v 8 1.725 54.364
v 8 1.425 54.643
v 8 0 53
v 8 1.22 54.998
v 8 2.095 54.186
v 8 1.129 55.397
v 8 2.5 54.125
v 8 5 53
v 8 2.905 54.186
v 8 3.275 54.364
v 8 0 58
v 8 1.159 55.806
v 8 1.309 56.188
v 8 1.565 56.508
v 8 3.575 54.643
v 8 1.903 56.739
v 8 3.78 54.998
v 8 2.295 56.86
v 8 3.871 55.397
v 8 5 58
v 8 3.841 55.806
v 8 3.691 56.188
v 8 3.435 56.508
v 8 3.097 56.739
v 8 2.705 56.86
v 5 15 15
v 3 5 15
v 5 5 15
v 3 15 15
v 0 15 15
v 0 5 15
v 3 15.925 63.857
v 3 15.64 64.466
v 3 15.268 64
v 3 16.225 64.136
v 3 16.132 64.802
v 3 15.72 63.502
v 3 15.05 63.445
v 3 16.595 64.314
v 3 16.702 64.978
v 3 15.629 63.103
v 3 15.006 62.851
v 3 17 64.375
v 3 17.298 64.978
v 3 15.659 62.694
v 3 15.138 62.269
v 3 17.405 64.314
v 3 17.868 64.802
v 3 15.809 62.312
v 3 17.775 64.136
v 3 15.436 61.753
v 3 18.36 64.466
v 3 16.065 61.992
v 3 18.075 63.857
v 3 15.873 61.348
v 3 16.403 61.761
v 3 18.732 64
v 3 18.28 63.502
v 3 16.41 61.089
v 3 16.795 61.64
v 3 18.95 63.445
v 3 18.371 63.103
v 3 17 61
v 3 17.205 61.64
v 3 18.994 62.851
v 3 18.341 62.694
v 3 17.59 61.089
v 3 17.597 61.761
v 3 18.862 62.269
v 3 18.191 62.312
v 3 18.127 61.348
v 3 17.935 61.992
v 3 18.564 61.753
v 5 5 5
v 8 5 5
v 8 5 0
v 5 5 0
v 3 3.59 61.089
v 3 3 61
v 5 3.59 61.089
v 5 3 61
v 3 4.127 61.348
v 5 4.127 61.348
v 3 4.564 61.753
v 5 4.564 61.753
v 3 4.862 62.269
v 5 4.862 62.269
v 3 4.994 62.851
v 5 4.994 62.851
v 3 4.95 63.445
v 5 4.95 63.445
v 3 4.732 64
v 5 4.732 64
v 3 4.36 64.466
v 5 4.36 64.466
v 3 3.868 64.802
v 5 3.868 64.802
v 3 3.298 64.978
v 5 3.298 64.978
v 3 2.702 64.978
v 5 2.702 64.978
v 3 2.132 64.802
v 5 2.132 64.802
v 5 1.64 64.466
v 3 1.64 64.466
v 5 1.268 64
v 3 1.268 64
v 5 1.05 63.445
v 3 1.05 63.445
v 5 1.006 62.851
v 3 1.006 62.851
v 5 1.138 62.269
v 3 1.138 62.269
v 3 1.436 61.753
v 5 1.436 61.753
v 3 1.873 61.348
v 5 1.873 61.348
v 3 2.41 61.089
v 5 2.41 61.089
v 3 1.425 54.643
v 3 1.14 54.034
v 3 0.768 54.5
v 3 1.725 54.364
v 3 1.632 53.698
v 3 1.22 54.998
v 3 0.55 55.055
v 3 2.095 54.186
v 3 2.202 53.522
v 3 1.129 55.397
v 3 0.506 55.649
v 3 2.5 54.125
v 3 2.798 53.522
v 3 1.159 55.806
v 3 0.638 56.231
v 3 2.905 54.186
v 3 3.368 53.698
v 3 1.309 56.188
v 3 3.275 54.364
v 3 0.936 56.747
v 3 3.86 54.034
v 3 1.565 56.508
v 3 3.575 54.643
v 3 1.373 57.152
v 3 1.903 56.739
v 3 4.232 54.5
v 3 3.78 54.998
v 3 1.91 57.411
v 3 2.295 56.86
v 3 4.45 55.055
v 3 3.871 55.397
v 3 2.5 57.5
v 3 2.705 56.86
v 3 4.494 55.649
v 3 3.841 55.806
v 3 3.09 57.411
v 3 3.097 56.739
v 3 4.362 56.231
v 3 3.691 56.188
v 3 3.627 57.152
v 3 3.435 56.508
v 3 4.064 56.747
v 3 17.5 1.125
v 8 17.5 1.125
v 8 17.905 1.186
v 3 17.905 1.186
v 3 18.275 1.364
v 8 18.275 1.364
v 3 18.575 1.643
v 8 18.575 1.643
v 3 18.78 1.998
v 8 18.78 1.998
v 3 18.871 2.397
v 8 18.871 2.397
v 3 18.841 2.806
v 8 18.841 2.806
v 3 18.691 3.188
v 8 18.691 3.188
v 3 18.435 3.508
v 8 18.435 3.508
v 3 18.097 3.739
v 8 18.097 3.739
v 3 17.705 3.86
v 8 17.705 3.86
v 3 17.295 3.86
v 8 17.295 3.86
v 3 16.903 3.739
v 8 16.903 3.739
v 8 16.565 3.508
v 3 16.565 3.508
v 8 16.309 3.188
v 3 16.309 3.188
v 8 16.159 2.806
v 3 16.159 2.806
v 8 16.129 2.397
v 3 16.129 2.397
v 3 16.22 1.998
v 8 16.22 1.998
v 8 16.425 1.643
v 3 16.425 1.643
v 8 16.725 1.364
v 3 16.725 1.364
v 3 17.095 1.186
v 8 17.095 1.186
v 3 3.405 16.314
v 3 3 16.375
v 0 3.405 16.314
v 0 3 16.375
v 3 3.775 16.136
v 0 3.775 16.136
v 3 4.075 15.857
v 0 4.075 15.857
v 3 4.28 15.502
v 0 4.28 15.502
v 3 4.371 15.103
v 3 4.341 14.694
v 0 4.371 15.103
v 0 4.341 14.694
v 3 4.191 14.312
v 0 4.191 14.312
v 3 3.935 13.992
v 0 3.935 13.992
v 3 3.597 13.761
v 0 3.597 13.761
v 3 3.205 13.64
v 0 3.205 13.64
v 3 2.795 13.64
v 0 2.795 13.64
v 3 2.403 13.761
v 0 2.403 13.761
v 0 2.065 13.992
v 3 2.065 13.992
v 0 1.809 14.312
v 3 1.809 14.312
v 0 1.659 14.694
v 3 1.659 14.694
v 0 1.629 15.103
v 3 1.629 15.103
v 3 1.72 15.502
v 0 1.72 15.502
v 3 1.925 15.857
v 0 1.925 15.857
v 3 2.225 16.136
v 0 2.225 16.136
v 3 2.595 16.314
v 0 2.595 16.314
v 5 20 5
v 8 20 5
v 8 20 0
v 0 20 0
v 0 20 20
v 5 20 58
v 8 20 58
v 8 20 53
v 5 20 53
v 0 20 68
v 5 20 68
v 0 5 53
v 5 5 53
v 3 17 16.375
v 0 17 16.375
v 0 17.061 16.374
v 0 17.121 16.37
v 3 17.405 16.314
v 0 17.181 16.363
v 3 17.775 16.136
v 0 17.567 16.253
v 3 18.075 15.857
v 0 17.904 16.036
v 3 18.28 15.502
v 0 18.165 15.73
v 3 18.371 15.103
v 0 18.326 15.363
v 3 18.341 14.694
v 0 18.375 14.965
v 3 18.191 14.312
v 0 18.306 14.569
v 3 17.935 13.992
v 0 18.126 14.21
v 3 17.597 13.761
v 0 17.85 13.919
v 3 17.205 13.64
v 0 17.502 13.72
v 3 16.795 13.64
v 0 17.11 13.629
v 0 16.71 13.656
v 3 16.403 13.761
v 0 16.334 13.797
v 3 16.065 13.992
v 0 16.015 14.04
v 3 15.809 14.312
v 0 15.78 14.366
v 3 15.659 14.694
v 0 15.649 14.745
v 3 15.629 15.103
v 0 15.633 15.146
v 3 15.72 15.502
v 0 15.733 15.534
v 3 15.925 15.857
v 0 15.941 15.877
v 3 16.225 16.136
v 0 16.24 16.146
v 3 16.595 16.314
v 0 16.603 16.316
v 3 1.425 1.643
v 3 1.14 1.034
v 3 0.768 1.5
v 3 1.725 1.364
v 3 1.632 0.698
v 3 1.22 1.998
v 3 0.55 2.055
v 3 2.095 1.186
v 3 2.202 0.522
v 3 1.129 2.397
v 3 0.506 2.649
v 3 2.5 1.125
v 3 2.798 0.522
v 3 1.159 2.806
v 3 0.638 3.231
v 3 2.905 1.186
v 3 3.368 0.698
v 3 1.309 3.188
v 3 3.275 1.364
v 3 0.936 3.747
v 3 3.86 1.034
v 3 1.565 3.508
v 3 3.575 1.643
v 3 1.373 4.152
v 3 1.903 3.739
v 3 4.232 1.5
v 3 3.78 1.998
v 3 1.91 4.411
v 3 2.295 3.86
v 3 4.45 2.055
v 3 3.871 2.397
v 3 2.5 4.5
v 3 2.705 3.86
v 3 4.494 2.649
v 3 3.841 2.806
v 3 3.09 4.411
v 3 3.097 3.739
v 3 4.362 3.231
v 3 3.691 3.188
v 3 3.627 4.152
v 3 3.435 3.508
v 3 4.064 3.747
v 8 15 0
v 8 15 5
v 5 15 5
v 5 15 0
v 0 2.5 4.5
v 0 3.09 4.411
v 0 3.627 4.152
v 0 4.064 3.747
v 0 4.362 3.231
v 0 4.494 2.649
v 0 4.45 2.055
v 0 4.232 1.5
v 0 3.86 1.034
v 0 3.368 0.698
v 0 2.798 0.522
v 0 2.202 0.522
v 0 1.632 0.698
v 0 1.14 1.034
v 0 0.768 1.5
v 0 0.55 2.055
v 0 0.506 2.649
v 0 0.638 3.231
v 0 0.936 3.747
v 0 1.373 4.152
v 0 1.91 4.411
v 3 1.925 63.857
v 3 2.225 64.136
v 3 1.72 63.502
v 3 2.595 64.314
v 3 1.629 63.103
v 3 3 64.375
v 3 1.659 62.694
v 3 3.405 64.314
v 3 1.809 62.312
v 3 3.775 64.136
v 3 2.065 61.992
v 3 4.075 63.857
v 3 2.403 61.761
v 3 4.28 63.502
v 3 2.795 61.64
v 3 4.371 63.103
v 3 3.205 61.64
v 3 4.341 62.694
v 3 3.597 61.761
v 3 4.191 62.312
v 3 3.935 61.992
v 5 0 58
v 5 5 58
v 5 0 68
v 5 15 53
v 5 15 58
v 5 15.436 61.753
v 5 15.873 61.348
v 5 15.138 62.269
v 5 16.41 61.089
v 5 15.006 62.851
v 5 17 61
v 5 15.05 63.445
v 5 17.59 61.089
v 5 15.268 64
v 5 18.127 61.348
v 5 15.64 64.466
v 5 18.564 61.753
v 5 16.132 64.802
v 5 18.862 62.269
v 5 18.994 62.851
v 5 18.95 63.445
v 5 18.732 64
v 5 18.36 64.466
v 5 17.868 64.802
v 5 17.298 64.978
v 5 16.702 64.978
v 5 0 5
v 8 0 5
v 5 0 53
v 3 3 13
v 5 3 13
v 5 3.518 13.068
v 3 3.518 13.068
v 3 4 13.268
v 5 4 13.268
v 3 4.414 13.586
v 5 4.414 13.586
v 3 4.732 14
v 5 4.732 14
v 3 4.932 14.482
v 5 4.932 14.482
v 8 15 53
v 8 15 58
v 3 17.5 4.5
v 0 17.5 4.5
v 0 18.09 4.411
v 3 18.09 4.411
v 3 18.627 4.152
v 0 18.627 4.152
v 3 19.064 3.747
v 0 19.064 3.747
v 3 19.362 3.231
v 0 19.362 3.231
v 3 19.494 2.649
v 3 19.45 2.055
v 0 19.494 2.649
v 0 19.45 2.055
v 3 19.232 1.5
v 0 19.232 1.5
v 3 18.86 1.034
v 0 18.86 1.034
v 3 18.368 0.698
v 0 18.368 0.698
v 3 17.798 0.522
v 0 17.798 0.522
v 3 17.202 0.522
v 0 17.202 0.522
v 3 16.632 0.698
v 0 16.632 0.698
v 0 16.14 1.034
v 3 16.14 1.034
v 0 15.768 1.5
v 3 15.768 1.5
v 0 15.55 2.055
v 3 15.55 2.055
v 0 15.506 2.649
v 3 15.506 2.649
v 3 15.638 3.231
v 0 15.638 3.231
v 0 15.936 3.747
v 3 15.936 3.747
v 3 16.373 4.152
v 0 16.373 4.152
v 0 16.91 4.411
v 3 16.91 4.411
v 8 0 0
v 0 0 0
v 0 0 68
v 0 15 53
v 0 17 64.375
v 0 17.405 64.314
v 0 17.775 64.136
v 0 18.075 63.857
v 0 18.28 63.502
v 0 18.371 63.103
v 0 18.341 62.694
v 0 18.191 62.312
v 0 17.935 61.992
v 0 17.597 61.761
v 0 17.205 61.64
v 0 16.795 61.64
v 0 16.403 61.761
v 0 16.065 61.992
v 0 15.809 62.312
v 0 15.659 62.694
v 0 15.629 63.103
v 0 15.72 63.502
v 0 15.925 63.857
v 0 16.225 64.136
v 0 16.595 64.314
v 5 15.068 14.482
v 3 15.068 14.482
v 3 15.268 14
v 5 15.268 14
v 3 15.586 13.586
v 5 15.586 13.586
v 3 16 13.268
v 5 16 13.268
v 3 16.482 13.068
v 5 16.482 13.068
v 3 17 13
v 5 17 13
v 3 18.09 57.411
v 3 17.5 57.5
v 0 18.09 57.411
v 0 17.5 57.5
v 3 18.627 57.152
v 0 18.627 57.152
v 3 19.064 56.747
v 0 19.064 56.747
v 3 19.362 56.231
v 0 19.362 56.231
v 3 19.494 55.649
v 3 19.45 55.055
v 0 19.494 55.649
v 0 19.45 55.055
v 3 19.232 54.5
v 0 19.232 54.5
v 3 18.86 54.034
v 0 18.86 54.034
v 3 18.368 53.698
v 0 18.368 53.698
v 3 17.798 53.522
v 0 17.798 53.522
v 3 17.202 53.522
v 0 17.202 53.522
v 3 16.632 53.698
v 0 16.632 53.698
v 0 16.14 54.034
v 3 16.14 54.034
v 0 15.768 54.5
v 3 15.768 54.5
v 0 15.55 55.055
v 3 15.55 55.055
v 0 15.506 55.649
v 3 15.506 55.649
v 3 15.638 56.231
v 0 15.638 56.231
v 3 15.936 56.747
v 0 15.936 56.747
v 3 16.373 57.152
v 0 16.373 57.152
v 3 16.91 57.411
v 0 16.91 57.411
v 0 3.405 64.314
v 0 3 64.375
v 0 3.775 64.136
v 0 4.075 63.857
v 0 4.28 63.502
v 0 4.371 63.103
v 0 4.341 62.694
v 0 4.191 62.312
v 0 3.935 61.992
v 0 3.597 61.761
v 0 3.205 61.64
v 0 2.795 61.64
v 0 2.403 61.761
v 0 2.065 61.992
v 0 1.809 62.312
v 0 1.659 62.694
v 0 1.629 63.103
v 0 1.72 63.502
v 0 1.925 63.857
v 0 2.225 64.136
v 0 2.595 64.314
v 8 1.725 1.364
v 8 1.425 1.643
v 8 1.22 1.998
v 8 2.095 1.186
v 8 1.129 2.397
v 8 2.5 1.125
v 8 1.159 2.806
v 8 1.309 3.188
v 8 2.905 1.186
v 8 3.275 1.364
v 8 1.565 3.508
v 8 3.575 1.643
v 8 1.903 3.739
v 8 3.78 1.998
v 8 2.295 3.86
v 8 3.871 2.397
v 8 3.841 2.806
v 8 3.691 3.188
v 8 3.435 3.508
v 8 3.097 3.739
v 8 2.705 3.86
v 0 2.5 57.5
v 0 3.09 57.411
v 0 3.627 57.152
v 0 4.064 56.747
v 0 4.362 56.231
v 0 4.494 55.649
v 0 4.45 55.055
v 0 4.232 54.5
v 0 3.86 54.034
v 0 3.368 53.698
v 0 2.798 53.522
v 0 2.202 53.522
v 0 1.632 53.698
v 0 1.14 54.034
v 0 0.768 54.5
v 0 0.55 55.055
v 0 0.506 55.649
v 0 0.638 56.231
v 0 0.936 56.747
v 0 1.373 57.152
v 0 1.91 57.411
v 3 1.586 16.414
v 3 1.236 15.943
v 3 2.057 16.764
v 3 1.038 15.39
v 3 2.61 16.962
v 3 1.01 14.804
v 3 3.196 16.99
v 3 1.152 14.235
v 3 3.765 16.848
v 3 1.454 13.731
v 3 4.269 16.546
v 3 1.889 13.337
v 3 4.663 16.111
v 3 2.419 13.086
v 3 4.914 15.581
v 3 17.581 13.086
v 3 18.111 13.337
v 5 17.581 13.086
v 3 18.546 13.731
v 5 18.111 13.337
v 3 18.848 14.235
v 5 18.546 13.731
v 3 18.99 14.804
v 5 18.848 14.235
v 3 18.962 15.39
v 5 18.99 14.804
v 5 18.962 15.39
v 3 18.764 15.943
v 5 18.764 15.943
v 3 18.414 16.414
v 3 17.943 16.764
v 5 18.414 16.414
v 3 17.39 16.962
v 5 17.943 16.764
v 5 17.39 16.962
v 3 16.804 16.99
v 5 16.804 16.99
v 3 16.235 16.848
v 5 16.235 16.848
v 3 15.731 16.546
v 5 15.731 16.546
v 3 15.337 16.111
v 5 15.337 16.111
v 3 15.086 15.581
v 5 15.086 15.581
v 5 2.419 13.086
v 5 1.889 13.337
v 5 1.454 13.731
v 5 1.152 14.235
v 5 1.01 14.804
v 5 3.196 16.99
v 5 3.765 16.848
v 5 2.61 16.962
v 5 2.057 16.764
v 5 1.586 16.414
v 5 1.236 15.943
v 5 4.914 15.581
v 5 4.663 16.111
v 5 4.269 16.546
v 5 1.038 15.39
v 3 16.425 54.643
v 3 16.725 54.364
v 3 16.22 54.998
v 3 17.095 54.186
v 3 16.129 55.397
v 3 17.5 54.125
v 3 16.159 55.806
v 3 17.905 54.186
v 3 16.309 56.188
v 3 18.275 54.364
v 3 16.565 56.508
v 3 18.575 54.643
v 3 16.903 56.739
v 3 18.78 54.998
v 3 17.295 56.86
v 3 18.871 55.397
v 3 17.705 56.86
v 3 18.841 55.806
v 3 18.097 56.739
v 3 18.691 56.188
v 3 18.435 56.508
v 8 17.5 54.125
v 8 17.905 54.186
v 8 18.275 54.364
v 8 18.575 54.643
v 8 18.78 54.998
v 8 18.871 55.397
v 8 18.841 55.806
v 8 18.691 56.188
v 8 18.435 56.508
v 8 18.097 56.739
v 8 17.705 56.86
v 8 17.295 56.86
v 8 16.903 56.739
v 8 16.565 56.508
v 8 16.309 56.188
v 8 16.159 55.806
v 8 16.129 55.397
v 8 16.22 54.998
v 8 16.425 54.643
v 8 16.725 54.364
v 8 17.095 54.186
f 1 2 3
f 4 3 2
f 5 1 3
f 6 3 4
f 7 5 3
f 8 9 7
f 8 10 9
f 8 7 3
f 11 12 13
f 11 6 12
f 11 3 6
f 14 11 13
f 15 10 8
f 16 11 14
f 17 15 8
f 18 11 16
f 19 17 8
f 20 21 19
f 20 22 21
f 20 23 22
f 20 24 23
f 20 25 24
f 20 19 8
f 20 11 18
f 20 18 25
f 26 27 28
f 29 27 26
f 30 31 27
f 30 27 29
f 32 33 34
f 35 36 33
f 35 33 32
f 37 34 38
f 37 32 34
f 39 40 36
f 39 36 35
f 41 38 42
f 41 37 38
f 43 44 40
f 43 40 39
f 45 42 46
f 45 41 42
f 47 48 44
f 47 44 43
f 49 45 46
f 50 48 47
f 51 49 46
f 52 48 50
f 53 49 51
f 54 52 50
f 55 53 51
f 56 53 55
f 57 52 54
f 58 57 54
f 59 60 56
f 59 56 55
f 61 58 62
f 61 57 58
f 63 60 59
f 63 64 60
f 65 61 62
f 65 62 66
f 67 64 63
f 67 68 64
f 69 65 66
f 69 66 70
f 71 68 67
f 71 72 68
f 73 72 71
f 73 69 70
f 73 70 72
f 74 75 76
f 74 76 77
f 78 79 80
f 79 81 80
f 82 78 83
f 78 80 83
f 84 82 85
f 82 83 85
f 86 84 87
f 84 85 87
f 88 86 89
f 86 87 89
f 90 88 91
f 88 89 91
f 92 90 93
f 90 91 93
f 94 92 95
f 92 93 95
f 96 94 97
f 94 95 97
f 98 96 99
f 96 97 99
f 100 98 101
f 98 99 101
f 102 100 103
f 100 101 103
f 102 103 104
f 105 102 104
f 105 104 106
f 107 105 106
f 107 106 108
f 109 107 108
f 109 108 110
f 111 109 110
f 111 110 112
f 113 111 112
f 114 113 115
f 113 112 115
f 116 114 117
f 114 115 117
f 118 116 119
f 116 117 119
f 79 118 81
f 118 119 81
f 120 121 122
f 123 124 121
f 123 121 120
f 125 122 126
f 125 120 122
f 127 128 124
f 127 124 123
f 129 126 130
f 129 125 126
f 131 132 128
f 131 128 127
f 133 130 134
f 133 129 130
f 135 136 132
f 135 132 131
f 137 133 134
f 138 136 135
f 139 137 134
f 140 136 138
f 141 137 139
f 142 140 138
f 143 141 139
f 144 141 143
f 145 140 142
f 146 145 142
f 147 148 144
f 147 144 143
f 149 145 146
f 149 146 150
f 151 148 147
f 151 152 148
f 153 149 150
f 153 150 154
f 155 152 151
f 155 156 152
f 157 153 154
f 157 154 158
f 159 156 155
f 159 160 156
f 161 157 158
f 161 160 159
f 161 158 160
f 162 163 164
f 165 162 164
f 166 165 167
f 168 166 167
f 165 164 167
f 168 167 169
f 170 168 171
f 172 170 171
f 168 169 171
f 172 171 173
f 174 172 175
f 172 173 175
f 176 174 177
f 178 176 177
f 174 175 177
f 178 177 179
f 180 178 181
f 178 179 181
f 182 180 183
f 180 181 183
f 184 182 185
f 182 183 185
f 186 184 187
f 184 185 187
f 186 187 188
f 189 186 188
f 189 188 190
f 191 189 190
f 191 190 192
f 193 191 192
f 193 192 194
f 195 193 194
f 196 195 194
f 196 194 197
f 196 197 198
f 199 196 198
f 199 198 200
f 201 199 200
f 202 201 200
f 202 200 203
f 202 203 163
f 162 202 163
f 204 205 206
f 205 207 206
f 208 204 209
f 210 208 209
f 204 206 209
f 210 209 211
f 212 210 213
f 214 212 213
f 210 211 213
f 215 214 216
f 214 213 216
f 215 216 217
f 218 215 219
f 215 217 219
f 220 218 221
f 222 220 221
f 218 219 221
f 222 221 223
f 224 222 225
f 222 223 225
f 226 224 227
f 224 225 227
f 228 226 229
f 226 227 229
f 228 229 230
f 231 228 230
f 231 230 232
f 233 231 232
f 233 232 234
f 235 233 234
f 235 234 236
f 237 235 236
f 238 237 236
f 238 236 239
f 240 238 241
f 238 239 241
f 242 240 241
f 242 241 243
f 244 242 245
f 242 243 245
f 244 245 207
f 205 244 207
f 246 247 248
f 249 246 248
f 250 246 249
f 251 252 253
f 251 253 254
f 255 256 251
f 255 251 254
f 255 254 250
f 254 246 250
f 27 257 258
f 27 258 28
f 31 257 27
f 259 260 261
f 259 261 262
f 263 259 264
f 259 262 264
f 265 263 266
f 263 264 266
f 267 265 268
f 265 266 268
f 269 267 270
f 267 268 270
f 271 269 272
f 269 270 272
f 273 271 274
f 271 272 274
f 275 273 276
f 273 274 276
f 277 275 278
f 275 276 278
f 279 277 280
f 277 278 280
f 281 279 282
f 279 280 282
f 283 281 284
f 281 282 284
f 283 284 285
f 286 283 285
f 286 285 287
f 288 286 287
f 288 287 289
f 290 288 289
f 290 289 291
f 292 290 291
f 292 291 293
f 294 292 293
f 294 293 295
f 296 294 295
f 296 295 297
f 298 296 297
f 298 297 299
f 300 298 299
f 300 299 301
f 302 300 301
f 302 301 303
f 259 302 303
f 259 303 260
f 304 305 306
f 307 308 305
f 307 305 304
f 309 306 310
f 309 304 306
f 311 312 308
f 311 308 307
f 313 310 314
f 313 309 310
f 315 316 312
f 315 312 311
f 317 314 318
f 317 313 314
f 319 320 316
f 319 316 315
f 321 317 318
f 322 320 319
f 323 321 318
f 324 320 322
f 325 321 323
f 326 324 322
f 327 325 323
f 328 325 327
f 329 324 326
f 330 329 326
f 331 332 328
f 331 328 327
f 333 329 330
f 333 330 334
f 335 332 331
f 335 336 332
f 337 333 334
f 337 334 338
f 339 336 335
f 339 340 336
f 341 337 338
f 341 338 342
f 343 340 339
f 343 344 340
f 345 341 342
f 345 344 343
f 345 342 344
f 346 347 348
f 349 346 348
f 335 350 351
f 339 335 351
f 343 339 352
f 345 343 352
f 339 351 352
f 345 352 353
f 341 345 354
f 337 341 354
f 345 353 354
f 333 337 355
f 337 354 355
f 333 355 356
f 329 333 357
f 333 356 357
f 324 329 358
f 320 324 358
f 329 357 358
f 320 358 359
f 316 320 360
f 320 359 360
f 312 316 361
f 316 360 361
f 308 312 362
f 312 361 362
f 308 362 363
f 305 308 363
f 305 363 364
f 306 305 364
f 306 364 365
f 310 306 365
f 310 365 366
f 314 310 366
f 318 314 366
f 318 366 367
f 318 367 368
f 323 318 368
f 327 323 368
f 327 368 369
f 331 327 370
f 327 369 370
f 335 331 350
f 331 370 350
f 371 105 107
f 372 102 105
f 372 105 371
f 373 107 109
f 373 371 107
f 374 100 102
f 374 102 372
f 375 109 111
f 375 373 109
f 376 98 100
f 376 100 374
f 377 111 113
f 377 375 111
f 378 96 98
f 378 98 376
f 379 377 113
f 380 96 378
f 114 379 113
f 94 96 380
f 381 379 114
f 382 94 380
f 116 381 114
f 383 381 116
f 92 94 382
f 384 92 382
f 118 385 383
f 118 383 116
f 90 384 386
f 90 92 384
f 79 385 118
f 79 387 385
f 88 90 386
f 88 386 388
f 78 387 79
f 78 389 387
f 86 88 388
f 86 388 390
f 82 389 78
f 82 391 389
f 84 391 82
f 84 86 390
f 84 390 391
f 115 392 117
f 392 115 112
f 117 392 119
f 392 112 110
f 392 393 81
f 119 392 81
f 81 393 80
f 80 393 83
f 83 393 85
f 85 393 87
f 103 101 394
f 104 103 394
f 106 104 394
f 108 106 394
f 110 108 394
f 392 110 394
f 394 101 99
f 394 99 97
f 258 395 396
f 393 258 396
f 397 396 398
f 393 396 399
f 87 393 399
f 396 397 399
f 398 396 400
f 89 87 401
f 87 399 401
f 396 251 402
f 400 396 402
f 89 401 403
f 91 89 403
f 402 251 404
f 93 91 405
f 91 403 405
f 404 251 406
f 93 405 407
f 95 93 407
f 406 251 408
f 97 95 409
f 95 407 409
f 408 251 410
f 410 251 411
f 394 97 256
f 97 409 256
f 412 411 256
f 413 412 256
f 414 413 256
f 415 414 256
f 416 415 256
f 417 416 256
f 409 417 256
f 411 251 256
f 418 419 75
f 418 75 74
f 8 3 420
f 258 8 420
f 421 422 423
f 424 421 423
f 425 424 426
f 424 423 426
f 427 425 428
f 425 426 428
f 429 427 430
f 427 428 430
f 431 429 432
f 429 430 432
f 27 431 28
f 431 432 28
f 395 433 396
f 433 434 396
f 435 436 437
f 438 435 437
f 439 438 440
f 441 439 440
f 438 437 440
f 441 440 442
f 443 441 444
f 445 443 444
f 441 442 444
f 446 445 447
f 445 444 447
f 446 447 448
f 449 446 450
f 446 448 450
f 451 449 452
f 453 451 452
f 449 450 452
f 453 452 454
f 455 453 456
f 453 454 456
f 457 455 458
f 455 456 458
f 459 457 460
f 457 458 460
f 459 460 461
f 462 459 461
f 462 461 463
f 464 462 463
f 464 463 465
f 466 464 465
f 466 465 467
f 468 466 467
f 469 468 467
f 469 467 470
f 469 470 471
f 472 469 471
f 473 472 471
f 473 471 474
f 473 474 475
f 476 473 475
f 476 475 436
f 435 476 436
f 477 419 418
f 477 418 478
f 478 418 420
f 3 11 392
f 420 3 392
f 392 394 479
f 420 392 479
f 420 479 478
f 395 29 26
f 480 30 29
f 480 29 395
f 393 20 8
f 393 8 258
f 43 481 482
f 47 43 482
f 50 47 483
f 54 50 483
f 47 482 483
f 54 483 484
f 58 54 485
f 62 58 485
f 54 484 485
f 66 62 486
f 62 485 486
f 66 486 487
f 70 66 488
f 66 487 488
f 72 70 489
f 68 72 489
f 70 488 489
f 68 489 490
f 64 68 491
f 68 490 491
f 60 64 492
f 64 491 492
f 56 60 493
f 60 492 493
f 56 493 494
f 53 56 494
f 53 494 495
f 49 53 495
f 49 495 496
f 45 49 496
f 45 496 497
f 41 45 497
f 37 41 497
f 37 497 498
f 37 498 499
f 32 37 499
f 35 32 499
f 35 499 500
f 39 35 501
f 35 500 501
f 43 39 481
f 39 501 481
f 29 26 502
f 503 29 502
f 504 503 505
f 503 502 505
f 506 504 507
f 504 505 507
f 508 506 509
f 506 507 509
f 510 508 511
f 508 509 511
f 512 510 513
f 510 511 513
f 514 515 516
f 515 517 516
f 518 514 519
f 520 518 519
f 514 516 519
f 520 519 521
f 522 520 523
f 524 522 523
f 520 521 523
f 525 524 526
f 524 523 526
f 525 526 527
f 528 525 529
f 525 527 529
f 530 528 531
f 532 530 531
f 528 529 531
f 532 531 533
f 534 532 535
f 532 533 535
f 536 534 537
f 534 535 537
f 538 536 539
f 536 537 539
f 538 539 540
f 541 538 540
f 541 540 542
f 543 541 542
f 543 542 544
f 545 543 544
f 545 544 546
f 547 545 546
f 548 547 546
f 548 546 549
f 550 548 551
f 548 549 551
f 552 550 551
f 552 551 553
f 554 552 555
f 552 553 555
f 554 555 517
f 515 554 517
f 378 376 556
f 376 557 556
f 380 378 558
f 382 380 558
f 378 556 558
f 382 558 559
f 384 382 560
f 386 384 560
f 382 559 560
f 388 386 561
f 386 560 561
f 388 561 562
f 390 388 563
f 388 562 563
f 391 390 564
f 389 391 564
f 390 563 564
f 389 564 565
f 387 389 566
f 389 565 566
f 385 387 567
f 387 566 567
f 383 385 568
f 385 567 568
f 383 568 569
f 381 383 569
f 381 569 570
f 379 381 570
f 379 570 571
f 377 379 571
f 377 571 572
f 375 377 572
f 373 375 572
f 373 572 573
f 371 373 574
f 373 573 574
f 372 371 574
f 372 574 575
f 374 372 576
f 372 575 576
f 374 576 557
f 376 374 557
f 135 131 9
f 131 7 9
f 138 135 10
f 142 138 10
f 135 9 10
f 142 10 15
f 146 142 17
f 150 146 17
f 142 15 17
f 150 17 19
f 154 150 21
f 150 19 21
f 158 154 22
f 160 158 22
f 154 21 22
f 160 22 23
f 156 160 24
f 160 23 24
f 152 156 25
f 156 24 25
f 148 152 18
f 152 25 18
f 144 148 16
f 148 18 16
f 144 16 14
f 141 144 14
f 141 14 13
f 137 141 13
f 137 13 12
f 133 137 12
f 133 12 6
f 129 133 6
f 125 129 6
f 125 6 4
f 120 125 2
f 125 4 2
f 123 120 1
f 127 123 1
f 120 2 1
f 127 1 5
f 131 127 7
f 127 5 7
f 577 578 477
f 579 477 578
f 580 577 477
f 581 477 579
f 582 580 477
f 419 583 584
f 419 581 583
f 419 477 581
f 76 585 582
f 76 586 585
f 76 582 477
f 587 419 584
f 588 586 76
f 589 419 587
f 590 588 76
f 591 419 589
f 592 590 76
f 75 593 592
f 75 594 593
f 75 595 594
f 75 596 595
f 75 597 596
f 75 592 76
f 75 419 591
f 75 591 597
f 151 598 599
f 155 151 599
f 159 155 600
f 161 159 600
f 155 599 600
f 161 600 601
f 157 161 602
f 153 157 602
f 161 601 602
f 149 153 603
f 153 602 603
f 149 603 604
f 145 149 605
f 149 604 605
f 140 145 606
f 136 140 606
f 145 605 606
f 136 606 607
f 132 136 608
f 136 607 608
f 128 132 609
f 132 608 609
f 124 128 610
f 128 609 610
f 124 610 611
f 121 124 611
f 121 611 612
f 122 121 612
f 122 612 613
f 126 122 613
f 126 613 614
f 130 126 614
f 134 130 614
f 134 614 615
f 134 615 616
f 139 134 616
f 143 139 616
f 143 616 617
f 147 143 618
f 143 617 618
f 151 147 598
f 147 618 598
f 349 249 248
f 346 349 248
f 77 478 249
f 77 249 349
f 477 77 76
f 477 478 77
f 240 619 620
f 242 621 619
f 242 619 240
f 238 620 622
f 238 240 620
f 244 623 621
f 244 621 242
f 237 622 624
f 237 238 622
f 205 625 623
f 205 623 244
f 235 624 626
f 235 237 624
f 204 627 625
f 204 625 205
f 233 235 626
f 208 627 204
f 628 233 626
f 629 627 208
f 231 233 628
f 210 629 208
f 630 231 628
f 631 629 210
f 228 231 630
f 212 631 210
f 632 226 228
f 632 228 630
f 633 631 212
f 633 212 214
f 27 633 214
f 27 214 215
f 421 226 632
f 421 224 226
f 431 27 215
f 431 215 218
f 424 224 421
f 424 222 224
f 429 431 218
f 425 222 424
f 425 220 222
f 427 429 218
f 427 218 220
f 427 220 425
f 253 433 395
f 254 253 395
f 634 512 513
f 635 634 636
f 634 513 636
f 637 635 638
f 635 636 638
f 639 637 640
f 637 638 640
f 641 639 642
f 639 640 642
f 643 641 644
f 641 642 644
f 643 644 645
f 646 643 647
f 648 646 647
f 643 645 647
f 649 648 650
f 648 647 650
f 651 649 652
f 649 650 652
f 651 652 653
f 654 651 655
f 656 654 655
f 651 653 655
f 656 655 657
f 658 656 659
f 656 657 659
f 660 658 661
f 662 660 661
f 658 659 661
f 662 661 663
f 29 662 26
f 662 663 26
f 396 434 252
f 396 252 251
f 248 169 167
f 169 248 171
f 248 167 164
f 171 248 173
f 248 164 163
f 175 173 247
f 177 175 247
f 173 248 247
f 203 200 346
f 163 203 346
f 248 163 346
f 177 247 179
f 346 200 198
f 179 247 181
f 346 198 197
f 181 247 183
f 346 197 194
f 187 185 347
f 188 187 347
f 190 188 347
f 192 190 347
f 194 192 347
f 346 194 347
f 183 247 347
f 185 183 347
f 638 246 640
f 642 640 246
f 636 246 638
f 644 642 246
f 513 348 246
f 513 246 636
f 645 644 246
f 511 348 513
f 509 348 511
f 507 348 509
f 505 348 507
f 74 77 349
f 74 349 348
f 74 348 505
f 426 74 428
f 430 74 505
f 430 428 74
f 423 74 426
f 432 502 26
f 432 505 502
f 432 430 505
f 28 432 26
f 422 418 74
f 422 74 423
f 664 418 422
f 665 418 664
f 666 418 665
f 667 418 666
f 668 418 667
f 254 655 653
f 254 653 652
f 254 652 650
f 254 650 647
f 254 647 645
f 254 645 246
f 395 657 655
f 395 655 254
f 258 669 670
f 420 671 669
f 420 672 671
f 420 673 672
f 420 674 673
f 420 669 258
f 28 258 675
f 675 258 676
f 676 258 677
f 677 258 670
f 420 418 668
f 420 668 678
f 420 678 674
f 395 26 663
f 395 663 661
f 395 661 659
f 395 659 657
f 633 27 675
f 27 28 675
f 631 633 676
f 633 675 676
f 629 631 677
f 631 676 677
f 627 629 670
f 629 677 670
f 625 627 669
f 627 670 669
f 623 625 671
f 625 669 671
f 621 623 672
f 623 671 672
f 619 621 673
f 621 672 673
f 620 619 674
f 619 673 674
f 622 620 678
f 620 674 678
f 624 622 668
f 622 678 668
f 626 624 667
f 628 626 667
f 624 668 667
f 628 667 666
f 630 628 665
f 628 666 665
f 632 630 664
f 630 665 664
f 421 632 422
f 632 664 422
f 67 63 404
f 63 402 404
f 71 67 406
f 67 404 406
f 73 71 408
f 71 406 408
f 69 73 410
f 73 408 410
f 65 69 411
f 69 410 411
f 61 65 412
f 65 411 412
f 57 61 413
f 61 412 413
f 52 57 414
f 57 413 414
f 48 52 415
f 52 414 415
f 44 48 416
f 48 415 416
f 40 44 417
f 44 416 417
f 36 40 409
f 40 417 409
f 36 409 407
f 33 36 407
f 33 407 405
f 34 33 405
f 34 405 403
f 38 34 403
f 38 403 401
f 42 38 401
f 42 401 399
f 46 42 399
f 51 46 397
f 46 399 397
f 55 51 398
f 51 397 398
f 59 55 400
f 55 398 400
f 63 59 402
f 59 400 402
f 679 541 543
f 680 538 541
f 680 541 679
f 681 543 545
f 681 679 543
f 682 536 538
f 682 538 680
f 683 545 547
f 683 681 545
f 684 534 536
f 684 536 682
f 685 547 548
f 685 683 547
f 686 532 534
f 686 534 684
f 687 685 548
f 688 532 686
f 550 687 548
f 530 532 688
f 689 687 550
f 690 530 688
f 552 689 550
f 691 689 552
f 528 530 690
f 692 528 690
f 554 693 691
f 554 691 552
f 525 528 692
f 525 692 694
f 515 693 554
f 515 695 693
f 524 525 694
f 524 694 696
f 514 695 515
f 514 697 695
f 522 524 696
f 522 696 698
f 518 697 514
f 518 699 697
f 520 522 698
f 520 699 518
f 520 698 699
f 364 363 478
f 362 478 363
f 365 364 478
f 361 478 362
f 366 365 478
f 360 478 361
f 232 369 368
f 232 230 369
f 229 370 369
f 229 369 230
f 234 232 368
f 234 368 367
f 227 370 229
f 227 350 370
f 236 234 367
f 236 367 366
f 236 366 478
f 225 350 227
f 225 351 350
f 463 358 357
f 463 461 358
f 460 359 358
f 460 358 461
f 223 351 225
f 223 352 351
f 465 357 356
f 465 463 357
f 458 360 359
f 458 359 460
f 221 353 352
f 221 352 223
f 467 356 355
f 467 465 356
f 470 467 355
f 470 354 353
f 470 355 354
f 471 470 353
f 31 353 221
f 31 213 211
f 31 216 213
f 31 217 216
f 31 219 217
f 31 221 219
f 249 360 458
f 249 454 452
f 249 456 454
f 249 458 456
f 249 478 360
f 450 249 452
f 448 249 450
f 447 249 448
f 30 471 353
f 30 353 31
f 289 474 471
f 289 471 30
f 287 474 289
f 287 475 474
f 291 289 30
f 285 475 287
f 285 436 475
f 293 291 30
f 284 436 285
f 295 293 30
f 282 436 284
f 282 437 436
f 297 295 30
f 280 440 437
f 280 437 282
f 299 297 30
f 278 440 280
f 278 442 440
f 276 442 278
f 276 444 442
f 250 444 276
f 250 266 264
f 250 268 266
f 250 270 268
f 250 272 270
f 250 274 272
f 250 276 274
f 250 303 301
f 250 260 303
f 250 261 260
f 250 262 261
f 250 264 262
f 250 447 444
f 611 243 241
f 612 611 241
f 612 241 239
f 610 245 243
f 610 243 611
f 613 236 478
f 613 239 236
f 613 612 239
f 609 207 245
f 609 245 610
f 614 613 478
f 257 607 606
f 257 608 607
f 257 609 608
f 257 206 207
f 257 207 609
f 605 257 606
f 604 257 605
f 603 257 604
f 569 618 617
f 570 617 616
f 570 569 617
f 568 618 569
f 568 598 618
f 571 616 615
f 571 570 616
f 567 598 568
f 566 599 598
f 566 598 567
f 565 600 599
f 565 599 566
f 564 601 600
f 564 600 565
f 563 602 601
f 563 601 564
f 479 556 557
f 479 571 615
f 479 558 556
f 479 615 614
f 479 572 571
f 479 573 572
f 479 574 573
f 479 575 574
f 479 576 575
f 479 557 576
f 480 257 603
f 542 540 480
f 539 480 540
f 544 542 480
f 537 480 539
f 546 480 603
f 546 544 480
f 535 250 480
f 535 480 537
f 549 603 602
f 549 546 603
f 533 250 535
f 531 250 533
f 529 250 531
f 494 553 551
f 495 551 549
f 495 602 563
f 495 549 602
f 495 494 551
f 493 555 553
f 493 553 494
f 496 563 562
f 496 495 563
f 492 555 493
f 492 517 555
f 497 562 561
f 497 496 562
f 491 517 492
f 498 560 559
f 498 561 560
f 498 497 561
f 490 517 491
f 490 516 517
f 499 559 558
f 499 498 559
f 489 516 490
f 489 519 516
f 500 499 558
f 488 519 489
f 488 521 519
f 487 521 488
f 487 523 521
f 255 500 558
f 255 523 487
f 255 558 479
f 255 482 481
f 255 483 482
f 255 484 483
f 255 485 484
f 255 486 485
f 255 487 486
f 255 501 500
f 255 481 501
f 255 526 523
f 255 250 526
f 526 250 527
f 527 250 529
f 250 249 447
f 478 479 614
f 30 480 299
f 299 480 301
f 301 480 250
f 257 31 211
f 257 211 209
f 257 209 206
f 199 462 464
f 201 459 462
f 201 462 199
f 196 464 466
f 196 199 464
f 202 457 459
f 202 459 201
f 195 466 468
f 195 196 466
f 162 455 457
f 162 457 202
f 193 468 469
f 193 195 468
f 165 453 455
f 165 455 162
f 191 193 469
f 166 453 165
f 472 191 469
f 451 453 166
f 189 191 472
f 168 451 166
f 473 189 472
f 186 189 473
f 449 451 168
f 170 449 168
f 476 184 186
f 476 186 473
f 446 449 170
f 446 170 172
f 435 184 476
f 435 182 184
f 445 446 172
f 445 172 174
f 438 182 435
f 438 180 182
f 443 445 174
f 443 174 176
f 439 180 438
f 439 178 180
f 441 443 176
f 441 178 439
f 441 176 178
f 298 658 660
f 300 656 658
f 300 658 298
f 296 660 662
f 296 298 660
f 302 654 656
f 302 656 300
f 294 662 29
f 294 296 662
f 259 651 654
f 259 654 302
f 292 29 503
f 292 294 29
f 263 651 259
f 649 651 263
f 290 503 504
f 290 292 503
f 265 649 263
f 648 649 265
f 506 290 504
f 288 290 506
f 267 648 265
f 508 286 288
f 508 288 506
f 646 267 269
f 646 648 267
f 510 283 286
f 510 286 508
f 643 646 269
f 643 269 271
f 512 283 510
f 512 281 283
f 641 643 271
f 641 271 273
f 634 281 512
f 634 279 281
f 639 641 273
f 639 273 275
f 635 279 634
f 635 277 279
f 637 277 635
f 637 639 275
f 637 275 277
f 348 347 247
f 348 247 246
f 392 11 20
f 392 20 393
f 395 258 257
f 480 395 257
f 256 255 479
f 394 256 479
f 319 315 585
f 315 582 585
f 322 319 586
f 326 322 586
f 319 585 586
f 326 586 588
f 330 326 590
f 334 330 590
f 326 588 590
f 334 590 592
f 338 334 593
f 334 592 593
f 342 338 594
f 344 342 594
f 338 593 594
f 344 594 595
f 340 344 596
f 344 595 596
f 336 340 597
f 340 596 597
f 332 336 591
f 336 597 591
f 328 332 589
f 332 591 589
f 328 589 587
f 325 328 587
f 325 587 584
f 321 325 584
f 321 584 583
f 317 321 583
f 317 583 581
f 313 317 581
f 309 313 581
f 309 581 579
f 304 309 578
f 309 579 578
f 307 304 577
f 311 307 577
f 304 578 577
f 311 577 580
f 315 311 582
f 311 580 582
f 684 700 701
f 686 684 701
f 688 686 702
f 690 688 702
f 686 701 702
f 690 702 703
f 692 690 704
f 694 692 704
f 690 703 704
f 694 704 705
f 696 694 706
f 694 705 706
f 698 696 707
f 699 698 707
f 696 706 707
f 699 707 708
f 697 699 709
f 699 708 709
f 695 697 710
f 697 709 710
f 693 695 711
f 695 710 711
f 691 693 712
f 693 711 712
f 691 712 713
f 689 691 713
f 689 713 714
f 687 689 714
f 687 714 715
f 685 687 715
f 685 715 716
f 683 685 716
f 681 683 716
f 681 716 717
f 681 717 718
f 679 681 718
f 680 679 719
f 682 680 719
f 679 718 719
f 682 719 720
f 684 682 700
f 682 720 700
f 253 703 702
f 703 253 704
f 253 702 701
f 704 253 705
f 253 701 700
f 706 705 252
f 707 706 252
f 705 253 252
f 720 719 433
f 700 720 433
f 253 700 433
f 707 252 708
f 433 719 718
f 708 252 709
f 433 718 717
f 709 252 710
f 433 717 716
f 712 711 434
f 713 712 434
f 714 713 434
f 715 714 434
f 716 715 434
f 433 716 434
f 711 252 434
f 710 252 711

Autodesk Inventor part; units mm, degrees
ref_plane "YZ Plane" through (0, 0, 0) normal (1, 0, 0) x (0, 1, 0)
ref_plane "XZ Plane" through (0, 0, 0) normal (0, 1, 0) x (-1, 0, 0)
ref_plane "XY Plane" through (0, 0, 0) normal (0, 0, 1) x (1, 0, 0)
sketch "Sketch1" plane through (0, 0, 0) normal (0, 1, 0) x (-1, 0, 0)
  line L0 (0, 0) -> (-5, 0)
  line L1 (-5, 0) -> (-5, 58)
  line L2 (-5, 58) -> (0, 58)
  line L3 (0, 58) -> (0, 0)
  line L4 (-5, 58) -> (-20, 58)
  line L5 (-20, 58) -> (-20, 53)
  line L6 (-20, 53) -> (-5, 53)
  line L7 (-5, 53) -> (-5, 58)
  line L8 (-5, 0) -> (-20, 0)
  line L9 (-20, 0) -> (-20, 5)
  line L10 (-20, 5) -> (-5, 5)
  line L11 (-5, 5) -> (-5, 0)
  point P0 (-5, 5)
  dimension "d0" = 5
  dimension "d1" = 5
  dimension "d2" = 5
  dimension "d3" = 15
  dimension "d4" = 15
  dimension "d5" = 48
extrude "Extrusion1" add sketch "Sketch1" along normal blind 20
sketch "Sketch2" plane through (0, 0, 58) normal (0, 0, 1) x (1, 0, 0)
  circle A0 centre (10, 10) radius 2.5
  line L0 (20, 0) -> (20, 20) projected
  line L1 (20, 0) -> (10, 0)
  line L2 (10, 0) -> (10, 20)
  line L3 (10, 20) -> (20, 20)
  line L4 (20, 20) -> (20, 0)
  line L5 (0, 0) -> (20, 0) projected
  line L6 (10, 4) -> (7, 4)
  line L7 (7, 4) -> (7, 16)
  line L8 (7, 16) -> (10, 16)
  line L9 (10, 16) -> (10, 4)
  dimension "d8" = 10
  dimension "d9" = 10
  dimension "d10" = 10
  dimension "d11" = 5
  dimension "d54" = 12
  dimension "d55" = 4
  dimension "d56" = 3
extrude "Extrusion2" cut sketch "Sketch2" against normal blind 200 contours A0 L2 | A0 L2 L3 L0 L1 | L2 A0
sketch "Sketch3" plane through (0, 0, 0) normal (-1, 0, 0) x (0, 0, 1)
  line L0 (5, 0) -> (5, 20) projected
  line L1 (53, 0) -> (53, 20) projected
  line L2 (5, 15) -> (53, 15)
  line L3 (53, 15) -> (53, 5)
  line L4 (53, 5) -> (5, 5)
  line L5 (5, 5) -> (5, 15)
  line L6 (0, 20) -> (58, 20) projected
  line L7 (0, 0) -> (58, 0) projected
  point P0 (5, 5)
  dimension "d14" = 5
  dimension "d15" = 5
extrude "Extrusion3" cut sketch "Sketch3" against normal blind 20 contours L0 L2 L1 L4
sketch "Sketch4" plane through (0, 0, 0) normal (-1, 0, 0) x (0, 0, 1)
  line L0 (58, 0) -> (58, 20) projected
  line L1 (58, 20) -> (68, 20)
  line L2 (68, 20) -> (68, 0)
  line L3 (68, 0) -> (58, 0)
  line L4 (58, 0) -> (58, 20)
  line L5 (20, 20) -> (10.5196, 12.6519)
  line L6 (20, 20) -> (10, 20)
  line L7 (10, 20) -> (10, 0)
  line L8 (10, 0) -> (20, 0)
  line L9 (20, 0) -> (20, 20)
  circle A0 centre (63, 3) radius 1.375
  circle A1 centre (63, 17) radius 1.375
  circle A2 centre (15, 17) radius 1.375
  circle A3 centre (15, 3) radius 1.375
  line L10 (0, 0) -> (58, 0) projected
  line L11 (0, 20) -> (58, 20) projected
  line L12 (0, 0) -> (0, 20) projected
  point P0 (10.5196, 0.1519)
  point P1 (63, 20)
  dimension "d18" = 10
  dimension "d19" = 10
  dimension "d20" = 3
  dimension "d21" = 3
  dimension "d22" = 5
  dimension "d23" = 5
  dimension "d24" = 5
  dimension "d25" = 5
  dimension "d26" = 3
  dimension "d27" = 3
  dimension "d28" = 2.75
  dimension "d29" = 2.75
  dimension "d30" = 2.75
  dimension "d31" = 2.75
  dimension "d63" = 0
  dimension "d64" = 0
  dimension "d65" = 10
extrude "Extrusion4" add sketch "Sketch4" against normal blind 5 contours L0 L1 L2 L3 | L8 L7 L6 L9
sketch "Sketch5" plane through (10, 12.5, 58) normal (1, 0, 0) x (0, 0, -1)
  circle A0 centre (55.5, 5) radius 1.375
  circle A1 centre (55.5, -10) radius 1.375
  circle A2 centre (2.5, 5) radius 1.375
  circle A3 centre (2.5, -10) radius 1.375
  line L0 (53, 7.5) -> (58, 7.5) projected
  line L1 (58, 7.5) -> (58, 0) projected
  line L2 (58, -5) -> (58, -12.5) projected
  line L3 (58, -12.5) -> (53, -12.5) projected
  line L4 (5, -12.5) -> (0, -12.5) projected
  line L5 (0, -12.5) -> (0, -5) projected
  line L6 (0, 0) -> (0, 7.5) projected
  line L7 (0, 7.5) -> (5, 7.5) projected
  dimension "d34" = 2.5
  dimension "d35" = 2.5
  dimension "d36" = 2.5
  dimension "d37" = 2.5
  dimension "d38" = 2.5
  dimension "d39" = 2.5
  dimension "d40" = 2.5
  dimension "d41" = 2.5
  dimension "d42" = 2.75
  dimension "d43" = 2.75
  dimension "d44" = 2.75
  dimension "d45" = 2.75
extrude "Extrusion5" cut sketch "Sketch5" against normal blind 15
sketch "Sketch6" plane through (0, 0, 68) normal (-1, 0, 0) x (0, 0, 1)
  circle A0 centre (-12.5, 17.5) radius 1.375 projected
  circle A1 centre (-12.5, 17.5) radius 2
  circle A2 centre (-12.5, 2.5) radius 1.375 projected
  circle A3 centre (-12.5, 2.5) radius 2
  circle A4 centre (-65.5, 2.5) radius 1.375 projected
  circle A5 centre (-65.5, 2.5) radius 2
  circle A6 centre (-65.5, 17.5) radius 1.375 projected
  circle A7 centre (-65.5, 17.5) radius 2
  point P0 (-68, 0)
  dimension "d48" = 4
  dimension "d49" = 4
  dimension "d50" = 4
  dimension "d51" = 4
extrude "Extrusion6" cut sketch "Sketch6" against normal blind 3 contours A0 | A1 | A2 | A3 | A4 | A5 | A6 | A7
sketch "Sketch7" plane through (10, 10, 58) normal (0, 0, 1) x (1, 0, 0)
  line L0 (-10, -10) -> (-5, -10) projected
  line L1 (-5, -10) -> (-2, -10)
  line L2 (-2, -10) -> (-2, -5)
  line L3 (-2, -5) -> (-5, -5)
  line L4 (-5, -5) -> (-5, -10)
  line L5 (-5, 5) -> (-5, 10) projected
  line L6 (-5, 10) -> (-2, 10)
  line L7 (-2, 10) -> (-2, 5)
  line L8 (-2, 5) -> (-5, 5)
  line L9 (-5, 5) -> (-5, 10)
  line L10 (-5, 10) -> (-5, -10) projected
  line L11 (-5, -10) -> (0, -10) projected
  line L12 (0, -10) -> (0, -2.5) projected
  arc A0 (0, 2.5) -> (0, -2.5) centre (0, 0) ccw projected
  line L13 (0, 2.5) -> (0, 10) projected
  line L14 (-5, 10) -> (0, 10) projected
  point P0 (-2, 10)
  point P1 (-2, -10)
  dimension "d57" = 5
  dimension "d58" = 5
  dimension "d59" = 3
  dimension "d60" = 3
extrude "Extrusion7" cut sketch "Sketch7" against normal blind 1000 contours L2 L3 L10 L8 L7 L14 L13 A0 L12 L11
sketch "Sketch8" plane through (0, 0, 0) normal (-1, 0, 0) x (0, 0, 1)
  circle A0 centre (2.5, 17.5) radius 2 projected
  circle A1 centre (55.5, 17.5) radius 2 projected
  circle A2 centre (2.5, 2.5) radius 2 projected
  circle A3 centre (55.5, 2.5) radius 2 projected
  line L0 (10, 5) -> (5, 5) projected
  line L1 (5, 5) -> (5, 15) projected
  line L2 (5, 15) -> (10, 15) projected
  line L3 (10, 15) -> (10, 5) projected
  circle A4 centre (63, 17) radius 1.375 projected
  circle A5 centre (63, 3) radius 1.375 projected
  line L4 (0, 0) -> (68, 0) projected
  line L5 (68, 0) -> (68, 20) projected
  line L6 (0, 20) -> (68, 20) projected
  line L7 (0, 0) -> (0, 20) projected
  line L8 (20, 5) -> (20, 15) projected
  line L9 (20, 15) -> (53, 15) projected
  line L10 (53, 15) -> (53, 5) projected
  line L11 (53, 5) -> (20, 5) projected
extrude "Extrusion8" add sketch "Sketch8" against normal blind 5 contours L0 L1 L2 L3
sketch "Sketch9" plane through (0, 0, 0) normal (-1, 0, 0) x (0, 0, 1)
  circle A0 centre (15, 17) radius 1.375
  circle A1 centre (15, 3) radius 1.375
  line L0 (68, 0) -> (68, 20) projected
  circle A2 centre (63, 3) radius 1.375 projected
  line L1 (0, 0) -> (68, 0) projected
  line L2 (0, 20) -> (68, 20) projected
  line L3 (20, 5) -> (20, 15) projected
  dimension "d68" = 5
  dimension "d69" = 3
  dimension "d70" = 3
  dimension "d71" = 3
  dimension "d72" = 5
  dimension "d73" = 5
  dimension "d74" = 2.75
  dimension "d75" = 2.75
  dimension "d76" = 2.75
extrude "Extrusion9" cut sketch "Sketch9" against normal blind 5 contours A0 | A1
sketch "Sketch10" plane through (0, 0, 0) normal (-1, 0, 0) x (0, 0, 1)
  line L0 (53, 5) -> (20, 5) projected
  line L1 (20, 5) -> (15, 5)
  line L2 (15, 5) -> (15, 15)
  line L3 (15, 15) -> (20, 15)
  line L4 (20, 15) -> (20, 5)
  point P0 (0, 0)
  dimension "d79" = 5
extrude "Extrusion10" cut sketch "Sketch10" against normal blind 5
sketch "Sketch11" plane through (5, 0, 0) normal (1, 0, 0) x (0, 0, -1)
  circle A0 centre (-63, 17) radius 1.375 projected
  circle A1 centre (-63, 17) radius 2
  circle A2 centre (-63, 3) radius 1.375 projected
  circle A3 centre (-63, 3) radius 2
  circle A4 centre (-15, 3) radius 1.375 projected
  circle A5 centre (-15, 3) radius 2
  circle A6 centre (-15, 17) radius 1.375 projected
  circle A7 centre (-15, 17) radius 2
  point P0 (0, 0)
  dimension "d82" = 4
  dimension "d83" = 4
  dimension "d84" = 4
  dimension "d85" = 4
extrude "Extrusion11" cut sketch "Sketch11" against normal blind 2 contours A0 | A1 | A2 | A3 | A4 | A5 | A6 | A7
equation "\"d14\" = d15"
equation "\"d19\" = d18"
equation "\"d20\" = d21"
equation "\"d24\" = d23"
equation "\"d25\" = d22"
equation "\"d26\" = d20"
equation "\"d27\" = d21"
equation "\"d34\" = d35"
equation "\"d37\" = d34"
equation "\"d38\" = d34"
equation "\"d39\" = d36"
equation "\"d40\" = d39"
equation "\"d41\" = d34"
equation "\"d44\" = d42"
equation "\"d45\" = d43"
equation "\"d49\" = d48"
equation "\"d50\" = d49"
equation "\"d51\" = d48"
equation "\"d75\" = d74"
equation "\"d76\" = d75"
properties part number "MotorDifferentialMountingBracket"
